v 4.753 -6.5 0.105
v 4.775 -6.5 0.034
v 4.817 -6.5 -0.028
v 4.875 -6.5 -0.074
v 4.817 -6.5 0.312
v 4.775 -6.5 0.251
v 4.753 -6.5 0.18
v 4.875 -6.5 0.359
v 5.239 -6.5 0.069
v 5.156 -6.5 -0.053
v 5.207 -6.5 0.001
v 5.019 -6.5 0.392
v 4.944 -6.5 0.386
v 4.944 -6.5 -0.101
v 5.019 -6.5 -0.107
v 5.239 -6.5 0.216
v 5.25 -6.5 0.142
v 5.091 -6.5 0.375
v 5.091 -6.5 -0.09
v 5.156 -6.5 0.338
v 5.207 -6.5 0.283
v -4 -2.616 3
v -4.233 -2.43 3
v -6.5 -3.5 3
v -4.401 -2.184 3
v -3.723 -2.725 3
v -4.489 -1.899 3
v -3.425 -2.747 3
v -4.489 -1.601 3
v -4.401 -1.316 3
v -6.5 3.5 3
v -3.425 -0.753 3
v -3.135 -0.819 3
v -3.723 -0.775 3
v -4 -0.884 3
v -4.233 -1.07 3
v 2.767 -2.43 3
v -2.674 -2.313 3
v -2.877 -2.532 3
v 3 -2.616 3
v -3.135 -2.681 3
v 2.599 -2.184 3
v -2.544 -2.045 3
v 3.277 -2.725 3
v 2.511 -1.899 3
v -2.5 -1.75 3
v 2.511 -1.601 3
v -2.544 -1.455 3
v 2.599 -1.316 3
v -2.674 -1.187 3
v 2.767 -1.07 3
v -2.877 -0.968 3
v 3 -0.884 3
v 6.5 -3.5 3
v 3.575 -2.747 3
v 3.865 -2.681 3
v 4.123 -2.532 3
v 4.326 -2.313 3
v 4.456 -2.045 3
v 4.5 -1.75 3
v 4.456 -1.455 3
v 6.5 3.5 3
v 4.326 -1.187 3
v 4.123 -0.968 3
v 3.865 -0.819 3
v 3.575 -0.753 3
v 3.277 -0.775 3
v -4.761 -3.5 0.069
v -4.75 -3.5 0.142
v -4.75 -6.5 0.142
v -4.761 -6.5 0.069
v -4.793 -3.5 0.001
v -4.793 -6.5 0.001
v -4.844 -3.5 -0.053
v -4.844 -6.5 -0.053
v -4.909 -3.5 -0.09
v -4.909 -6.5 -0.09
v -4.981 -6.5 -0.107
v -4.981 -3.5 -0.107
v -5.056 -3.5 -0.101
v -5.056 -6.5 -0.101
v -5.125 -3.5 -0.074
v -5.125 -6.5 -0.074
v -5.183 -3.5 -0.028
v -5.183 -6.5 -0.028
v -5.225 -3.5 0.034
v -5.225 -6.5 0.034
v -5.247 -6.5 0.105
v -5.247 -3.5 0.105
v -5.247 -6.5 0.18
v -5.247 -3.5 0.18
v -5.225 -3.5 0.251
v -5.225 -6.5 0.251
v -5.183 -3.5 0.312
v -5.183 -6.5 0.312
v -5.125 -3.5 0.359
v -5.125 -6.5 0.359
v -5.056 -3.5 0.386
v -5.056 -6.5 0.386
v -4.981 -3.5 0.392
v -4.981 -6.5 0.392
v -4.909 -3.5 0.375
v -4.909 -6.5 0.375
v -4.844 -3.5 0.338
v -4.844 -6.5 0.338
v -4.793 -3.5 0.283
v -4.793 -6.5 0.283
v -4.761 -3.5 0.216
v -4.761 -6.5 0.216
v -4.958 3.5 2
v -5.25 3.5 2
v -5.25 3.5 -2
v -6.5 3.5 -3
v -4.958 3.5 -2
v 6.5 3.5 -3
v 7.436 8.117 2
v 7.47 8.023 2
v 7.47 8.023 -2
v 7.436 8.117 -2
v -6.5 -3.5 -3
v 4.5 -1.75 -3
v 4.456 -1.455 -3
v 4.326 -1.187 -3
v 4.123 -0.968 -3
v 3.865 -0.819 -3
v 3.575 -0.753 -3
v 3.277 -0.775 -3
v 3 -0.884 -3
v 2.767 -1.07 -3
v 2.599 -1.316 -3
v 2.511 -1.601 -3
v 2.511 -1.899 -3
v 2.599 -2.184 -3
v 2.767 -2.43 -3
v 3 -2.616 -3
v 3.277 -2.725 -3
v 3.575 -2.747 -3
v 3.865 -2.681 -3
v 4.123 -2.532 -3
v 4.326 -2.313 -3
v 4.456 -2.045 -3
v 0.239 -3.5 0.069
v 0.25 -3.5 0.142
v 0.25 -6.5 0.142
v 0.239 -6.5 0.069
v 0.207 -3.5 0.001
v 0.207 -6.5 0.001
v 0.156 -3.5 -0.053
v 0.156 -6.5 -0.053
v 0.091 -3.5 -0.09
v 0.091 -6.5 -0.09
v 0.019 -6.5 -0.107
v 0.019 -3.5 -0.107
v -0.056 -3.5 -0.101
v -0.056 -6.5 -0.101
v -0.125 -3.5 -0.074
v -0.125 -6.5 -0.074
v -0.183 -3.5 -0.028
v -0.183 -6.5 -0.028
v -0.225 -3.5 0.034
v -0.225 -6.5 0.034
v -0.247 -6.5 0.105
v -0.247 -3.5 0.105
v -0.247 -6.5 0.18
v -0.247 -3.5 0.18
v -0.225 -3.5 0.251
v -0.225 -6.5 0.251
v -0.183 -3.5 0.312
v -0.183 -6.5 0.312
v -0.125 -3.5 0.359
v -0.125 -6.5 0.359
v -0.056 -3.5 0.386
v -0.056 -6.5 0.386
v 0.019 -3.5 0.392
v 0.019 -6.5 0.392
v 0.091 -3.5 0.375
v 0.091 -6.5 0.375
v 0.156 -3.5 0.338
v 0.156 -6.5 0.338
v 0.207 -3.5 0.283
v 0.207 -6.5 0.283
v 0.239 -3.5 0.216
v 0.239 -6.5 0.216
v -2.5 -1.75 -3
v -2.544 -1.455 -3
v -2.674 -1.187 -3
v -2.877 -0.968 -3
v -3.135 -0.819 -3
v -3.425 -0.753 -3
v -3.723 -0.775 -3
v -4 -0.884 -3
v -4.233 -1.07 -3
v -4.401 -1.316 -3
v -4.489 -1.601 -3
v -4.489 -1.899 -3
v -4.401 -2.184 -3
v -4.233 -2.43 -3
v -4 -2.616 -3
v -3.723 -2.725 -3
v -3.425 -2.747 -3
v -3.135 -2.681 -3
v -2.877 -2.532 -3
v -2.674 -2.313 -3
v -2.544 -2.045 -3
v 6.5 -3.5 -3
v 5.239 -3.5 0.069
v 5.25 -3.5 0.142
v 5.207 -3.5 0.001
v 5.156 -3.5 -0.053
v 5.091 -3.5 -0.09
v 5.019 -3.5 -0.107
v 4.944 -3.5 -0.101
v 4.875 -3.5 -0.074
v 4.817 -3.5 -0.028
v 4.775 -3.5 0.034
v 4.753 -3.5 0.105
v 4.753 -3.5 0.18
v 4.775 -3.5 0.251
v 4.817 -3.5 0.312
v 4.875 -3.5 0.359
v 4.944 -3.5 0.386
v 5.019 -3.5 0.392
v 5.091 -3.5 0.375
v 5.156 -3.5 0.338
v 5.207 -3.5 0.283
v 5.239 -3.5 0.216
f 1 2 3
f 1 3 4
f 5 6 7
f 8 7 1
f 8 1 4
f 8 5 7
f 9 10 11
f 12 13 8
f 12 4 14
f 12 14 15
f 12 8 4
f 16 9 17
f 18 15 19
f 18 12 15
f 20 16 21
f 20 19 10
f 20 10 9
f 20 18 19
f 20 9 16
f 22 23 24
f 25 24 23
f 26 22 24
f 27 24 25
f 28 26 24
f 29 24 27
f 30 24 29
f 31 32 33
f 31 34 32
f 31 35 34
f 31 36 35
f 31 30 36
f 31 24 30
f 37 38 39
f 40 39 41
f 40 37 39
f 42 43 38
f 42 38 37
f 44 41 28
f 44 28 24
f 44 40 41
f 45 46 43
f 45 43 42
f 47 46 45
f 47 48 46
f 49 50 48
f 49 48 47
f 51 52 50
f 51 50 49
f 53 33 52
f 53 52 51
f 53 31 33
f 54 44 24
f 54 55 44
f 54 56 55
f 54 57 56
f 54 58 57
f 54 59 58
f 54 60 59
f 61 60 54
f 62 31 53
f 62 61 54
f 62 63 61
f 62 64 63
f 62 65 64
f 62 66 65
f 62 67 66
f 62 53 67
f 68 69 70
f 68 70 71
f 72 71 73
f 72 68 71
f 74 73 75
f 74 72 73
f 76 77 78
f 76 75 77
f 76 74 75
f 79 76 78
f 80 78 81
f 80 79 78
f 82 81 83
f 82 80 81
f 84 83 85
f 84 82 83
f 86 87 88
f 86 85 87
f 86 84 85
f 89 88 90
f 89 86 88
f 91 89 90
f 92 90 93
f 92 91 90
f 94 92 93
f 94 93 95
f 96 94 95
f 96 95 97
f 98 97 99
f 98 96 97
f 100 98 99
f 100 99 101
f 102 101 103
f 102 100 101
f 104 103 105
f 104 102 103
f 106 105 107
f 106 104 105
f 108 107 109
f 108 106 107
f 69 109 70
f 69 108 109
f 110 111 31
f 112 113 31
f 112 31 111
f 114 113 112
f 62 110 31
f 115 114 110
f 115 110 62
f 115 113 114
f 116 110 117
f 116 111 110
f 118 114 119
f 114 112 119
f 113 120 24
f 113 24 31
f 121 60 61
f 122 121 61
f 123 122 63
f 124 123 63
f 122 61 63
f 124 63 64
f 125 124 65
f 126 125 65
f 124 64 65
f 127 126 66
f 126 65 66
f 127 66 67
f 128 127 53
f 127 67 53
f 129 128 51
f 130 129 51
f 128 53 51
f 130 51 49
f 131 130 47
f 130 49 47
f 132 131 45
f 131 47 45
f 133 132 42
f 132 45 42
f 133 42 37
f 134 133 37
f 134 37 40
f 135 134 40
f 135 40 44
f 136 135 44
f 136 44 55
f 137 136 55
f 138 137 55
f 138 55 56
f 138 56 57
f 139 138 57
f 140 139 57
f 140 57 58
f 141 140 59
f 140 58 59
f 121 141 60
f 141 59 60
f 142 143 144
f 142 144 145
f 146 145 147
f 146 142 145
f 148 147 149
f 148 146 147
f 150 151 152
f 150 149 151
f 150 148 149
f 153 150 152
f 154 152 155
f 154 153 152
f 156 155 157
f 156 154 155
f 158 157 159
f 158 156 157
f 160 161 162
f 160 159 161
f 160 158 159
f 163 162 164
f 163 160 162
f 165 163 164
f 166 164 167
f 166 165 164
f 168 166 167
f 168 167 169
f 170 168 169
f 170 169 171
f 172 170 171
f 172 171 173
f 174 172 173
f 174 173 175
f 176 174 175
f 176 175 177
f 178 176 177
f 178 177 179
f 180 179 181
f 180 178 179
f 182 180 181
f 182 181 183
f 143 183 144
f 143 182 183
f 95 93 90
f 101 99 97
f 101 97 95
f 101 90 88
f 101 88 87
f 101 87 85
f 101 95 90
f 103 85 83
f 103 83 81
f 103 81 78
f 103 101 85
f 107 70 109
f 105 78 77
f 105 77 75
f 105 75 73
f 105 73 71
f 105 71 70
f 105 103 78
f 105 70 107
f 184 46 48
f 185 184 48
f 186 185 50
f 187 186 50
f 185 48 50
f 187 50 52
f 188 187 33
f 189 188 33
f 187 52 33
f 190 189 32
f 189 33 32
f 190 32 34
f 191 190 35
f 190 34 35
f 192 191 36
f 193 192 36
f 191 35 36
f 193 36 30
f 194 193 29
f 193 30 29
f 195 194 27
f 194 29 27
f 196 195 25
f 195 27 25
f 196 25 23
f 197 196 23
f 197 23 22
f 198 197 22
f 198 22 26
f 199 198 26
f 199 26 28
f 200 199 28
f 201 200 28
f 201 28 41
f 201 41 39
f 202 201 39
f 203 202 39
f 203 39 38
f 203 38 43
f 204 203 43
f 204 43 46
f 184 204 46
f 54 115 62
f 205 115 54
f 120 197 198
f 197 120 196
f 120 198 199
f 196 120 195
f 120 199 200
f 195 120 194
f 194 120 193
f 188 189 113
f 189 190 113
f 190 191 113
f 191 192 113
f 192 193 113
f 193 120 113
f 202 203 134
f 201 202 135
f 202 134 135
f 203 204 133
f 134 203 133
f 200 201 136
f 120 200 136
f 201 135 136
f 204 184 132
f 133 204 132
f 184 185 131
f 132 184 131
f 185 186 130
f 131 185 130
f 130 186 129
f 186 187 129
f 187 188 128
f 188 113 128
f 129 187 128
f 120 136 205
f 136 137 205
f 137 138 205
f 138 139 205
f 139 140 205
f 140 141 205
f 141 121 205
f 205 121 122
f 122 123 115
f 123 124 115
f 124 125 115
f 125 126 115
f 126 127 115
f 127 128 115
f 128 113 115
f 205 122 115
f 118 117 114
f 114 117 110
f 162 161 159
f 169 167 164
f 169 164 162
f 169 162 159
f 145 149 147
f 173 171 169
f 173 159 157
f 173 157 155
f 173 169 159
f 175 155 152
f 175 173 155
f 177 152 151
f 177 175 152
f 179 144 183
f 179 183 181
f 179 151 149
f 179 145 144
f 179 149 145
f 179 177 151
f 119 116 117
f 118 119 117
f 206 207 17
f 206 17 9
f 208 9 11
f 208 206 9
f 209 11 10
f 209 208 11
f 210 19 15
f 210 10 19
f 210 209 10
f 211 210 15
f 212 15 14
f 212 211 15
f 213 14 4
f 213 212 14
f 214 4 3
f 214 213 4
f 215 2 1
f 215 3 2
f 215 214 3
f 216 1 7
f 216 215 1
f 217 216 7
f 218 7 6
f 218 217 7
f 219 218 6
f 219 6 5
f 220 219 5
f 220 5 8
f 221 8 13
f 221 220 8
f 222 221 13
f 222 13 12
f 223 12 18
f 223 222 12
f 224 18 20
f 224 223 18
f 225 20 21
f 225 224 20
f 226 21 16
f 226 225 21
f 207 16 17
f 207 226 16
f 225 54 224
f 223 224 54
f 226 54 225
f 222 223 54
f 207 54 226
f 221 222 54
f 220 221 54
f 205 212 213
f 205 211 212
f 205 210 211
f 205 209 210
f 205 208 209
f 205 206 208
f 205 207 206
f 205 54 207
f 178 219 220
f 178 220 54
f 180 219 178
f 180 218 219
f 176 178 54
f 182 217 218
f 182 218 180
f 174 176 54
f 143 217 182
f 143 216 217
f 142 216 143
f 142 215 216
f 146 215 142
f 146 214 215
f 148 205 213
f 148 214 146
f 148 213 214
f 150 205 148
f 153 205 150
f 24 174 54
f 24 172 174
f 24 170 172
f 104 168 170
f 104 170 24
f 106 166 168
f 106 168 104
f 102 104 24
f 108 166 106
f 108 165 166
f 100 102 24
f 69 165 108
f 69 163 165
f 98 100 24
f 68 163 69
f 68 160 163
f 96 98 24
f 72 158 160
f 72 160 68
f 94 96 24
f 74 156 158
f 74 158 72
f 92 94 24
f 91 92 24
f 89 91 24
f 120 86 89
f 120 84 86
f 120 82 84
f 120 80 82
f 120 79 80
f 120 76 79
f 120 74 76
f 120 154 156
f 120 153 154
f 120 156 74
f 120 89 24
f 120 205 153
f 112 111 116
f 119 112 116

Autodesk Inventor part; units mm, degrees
ref_plane "YZ Plane" through (0, 0, 0) normal (1, 0, 0) x (0, 1, 0)
ref_plane "XZ Plane" through (0, 0, 0) normal (0, 1, 0) x (-1, 0, 0)
ref_plane "XY Plane" through (0, 0, 0) normal (0, 0, 1) x (1, 0, 0)
sketch "Boceto1" plane through (0, 0, 0) normal (0, 0, 1) x (1, 0, 0)
  line L0 (-6.5, 3.5) -> (6.5, 3.5)
  line L1 (6.5, 3.5) -> (6.5, -3.5)
  line L2 (6.5, -3.5) -> (-6.5, -3.5)
  line L3 (-6.5, -3.5) -> (-6.5, 3.5)
  line L4 (0, -4.9) -> (0, 4.9) projected
  line L5 (-9.1, 0) -> (9.1, 0) projected
  point P0 (0, 0)
  dimension "d0" = 13
  dimension "d1" = 7
extrude "Extrusión1" add sketch "Boceto1" along normal mid plane 6
sketch "Boceto2" plane through (0, 0, 3) normal (0, 0, 1) x (1, 0, 0)
  circle A0 centre (3.5, -1.75) radius 1
  circle A1 centre (-3.5, -1.75) radius 1
  line L0 (-6.5, 3.5) -> (-6.5, -3.5) projected
  line L1 (6.5, -3.5) -> (6.5, 3.5) projected
  line L2 (-6.5, -3.5) -> (6.5, -3.5) projected
  point P0 (0, 0)
  dimension "d4" = 2
  dimension "d5" = 2
  dimension "d6" = 3
  dimension "d8" = 3
  dimension "d25" = 1.75
  dimension "d26" = 1.75
extrude "Extrusión2" cut sketch "Boceto2" against normal up to surface (6 mm away)
sketch "Boceto3" plane through (0, 0, 0) normal (0, 0, 1) x (1, 0, 0)
  line L0 (-6.5, 3.5) -> (6.5, 3.5) projected
  line L1 (-6.5, 3.5) -> (-5.25, 3.5)
  line L2 (-5.25, 3.5) -> (7.4359, 8.1173)
  line L3 (7.4359, 8.1173) -> (7.4701, 8.0233)
  line L4 (7.4701, 8.0233) -> (-4.9576, 3.5)
  line L5 (-4.9576, 3.5) -> (-5.25, 3.5)
  point P0 (0, 0)
  dimension "d11" = 1.25
  dimension "d12" = 13.5
  dimension "d13" = 160
  dimension "d14" = 0.1
  dimension "d15" = 90
extrude "Extrusión3" add sketch "Boceto3" against normal mid plane 4
sketch "Boceto4" plane through (-6.5, -3.5, -3) normal (0, -1, 0) x (1, 0, 0)
  circle A0 centre (1.5, 3.1423) radius 0.25
  circle A1 centre (11.5, 3.1423) radius 0.25
  line L0 (0, 0) -> (0, 6) projected
  circle A2 centre (6.5, 3.1423) radius 0.25
  line L1 (13, 6) -> (13, 0) projected
  point P0 (6.5, 3)
  dimension "d18" = 1.5
  dimension "d20" = 0.5
  dimension "d21" = 0.5
  dimension "d22" = 0.5
  dimension "d27" = 1.5
extrude "Extrusión4" add sketch "Boceto4" along normal blind 3
equation "\"d5\" = d4"
equation "\"d26\" = d25"
equation "\"d21\" = d20"
equation "\"d22\" = d21"
properties part number "Micro Switch"
